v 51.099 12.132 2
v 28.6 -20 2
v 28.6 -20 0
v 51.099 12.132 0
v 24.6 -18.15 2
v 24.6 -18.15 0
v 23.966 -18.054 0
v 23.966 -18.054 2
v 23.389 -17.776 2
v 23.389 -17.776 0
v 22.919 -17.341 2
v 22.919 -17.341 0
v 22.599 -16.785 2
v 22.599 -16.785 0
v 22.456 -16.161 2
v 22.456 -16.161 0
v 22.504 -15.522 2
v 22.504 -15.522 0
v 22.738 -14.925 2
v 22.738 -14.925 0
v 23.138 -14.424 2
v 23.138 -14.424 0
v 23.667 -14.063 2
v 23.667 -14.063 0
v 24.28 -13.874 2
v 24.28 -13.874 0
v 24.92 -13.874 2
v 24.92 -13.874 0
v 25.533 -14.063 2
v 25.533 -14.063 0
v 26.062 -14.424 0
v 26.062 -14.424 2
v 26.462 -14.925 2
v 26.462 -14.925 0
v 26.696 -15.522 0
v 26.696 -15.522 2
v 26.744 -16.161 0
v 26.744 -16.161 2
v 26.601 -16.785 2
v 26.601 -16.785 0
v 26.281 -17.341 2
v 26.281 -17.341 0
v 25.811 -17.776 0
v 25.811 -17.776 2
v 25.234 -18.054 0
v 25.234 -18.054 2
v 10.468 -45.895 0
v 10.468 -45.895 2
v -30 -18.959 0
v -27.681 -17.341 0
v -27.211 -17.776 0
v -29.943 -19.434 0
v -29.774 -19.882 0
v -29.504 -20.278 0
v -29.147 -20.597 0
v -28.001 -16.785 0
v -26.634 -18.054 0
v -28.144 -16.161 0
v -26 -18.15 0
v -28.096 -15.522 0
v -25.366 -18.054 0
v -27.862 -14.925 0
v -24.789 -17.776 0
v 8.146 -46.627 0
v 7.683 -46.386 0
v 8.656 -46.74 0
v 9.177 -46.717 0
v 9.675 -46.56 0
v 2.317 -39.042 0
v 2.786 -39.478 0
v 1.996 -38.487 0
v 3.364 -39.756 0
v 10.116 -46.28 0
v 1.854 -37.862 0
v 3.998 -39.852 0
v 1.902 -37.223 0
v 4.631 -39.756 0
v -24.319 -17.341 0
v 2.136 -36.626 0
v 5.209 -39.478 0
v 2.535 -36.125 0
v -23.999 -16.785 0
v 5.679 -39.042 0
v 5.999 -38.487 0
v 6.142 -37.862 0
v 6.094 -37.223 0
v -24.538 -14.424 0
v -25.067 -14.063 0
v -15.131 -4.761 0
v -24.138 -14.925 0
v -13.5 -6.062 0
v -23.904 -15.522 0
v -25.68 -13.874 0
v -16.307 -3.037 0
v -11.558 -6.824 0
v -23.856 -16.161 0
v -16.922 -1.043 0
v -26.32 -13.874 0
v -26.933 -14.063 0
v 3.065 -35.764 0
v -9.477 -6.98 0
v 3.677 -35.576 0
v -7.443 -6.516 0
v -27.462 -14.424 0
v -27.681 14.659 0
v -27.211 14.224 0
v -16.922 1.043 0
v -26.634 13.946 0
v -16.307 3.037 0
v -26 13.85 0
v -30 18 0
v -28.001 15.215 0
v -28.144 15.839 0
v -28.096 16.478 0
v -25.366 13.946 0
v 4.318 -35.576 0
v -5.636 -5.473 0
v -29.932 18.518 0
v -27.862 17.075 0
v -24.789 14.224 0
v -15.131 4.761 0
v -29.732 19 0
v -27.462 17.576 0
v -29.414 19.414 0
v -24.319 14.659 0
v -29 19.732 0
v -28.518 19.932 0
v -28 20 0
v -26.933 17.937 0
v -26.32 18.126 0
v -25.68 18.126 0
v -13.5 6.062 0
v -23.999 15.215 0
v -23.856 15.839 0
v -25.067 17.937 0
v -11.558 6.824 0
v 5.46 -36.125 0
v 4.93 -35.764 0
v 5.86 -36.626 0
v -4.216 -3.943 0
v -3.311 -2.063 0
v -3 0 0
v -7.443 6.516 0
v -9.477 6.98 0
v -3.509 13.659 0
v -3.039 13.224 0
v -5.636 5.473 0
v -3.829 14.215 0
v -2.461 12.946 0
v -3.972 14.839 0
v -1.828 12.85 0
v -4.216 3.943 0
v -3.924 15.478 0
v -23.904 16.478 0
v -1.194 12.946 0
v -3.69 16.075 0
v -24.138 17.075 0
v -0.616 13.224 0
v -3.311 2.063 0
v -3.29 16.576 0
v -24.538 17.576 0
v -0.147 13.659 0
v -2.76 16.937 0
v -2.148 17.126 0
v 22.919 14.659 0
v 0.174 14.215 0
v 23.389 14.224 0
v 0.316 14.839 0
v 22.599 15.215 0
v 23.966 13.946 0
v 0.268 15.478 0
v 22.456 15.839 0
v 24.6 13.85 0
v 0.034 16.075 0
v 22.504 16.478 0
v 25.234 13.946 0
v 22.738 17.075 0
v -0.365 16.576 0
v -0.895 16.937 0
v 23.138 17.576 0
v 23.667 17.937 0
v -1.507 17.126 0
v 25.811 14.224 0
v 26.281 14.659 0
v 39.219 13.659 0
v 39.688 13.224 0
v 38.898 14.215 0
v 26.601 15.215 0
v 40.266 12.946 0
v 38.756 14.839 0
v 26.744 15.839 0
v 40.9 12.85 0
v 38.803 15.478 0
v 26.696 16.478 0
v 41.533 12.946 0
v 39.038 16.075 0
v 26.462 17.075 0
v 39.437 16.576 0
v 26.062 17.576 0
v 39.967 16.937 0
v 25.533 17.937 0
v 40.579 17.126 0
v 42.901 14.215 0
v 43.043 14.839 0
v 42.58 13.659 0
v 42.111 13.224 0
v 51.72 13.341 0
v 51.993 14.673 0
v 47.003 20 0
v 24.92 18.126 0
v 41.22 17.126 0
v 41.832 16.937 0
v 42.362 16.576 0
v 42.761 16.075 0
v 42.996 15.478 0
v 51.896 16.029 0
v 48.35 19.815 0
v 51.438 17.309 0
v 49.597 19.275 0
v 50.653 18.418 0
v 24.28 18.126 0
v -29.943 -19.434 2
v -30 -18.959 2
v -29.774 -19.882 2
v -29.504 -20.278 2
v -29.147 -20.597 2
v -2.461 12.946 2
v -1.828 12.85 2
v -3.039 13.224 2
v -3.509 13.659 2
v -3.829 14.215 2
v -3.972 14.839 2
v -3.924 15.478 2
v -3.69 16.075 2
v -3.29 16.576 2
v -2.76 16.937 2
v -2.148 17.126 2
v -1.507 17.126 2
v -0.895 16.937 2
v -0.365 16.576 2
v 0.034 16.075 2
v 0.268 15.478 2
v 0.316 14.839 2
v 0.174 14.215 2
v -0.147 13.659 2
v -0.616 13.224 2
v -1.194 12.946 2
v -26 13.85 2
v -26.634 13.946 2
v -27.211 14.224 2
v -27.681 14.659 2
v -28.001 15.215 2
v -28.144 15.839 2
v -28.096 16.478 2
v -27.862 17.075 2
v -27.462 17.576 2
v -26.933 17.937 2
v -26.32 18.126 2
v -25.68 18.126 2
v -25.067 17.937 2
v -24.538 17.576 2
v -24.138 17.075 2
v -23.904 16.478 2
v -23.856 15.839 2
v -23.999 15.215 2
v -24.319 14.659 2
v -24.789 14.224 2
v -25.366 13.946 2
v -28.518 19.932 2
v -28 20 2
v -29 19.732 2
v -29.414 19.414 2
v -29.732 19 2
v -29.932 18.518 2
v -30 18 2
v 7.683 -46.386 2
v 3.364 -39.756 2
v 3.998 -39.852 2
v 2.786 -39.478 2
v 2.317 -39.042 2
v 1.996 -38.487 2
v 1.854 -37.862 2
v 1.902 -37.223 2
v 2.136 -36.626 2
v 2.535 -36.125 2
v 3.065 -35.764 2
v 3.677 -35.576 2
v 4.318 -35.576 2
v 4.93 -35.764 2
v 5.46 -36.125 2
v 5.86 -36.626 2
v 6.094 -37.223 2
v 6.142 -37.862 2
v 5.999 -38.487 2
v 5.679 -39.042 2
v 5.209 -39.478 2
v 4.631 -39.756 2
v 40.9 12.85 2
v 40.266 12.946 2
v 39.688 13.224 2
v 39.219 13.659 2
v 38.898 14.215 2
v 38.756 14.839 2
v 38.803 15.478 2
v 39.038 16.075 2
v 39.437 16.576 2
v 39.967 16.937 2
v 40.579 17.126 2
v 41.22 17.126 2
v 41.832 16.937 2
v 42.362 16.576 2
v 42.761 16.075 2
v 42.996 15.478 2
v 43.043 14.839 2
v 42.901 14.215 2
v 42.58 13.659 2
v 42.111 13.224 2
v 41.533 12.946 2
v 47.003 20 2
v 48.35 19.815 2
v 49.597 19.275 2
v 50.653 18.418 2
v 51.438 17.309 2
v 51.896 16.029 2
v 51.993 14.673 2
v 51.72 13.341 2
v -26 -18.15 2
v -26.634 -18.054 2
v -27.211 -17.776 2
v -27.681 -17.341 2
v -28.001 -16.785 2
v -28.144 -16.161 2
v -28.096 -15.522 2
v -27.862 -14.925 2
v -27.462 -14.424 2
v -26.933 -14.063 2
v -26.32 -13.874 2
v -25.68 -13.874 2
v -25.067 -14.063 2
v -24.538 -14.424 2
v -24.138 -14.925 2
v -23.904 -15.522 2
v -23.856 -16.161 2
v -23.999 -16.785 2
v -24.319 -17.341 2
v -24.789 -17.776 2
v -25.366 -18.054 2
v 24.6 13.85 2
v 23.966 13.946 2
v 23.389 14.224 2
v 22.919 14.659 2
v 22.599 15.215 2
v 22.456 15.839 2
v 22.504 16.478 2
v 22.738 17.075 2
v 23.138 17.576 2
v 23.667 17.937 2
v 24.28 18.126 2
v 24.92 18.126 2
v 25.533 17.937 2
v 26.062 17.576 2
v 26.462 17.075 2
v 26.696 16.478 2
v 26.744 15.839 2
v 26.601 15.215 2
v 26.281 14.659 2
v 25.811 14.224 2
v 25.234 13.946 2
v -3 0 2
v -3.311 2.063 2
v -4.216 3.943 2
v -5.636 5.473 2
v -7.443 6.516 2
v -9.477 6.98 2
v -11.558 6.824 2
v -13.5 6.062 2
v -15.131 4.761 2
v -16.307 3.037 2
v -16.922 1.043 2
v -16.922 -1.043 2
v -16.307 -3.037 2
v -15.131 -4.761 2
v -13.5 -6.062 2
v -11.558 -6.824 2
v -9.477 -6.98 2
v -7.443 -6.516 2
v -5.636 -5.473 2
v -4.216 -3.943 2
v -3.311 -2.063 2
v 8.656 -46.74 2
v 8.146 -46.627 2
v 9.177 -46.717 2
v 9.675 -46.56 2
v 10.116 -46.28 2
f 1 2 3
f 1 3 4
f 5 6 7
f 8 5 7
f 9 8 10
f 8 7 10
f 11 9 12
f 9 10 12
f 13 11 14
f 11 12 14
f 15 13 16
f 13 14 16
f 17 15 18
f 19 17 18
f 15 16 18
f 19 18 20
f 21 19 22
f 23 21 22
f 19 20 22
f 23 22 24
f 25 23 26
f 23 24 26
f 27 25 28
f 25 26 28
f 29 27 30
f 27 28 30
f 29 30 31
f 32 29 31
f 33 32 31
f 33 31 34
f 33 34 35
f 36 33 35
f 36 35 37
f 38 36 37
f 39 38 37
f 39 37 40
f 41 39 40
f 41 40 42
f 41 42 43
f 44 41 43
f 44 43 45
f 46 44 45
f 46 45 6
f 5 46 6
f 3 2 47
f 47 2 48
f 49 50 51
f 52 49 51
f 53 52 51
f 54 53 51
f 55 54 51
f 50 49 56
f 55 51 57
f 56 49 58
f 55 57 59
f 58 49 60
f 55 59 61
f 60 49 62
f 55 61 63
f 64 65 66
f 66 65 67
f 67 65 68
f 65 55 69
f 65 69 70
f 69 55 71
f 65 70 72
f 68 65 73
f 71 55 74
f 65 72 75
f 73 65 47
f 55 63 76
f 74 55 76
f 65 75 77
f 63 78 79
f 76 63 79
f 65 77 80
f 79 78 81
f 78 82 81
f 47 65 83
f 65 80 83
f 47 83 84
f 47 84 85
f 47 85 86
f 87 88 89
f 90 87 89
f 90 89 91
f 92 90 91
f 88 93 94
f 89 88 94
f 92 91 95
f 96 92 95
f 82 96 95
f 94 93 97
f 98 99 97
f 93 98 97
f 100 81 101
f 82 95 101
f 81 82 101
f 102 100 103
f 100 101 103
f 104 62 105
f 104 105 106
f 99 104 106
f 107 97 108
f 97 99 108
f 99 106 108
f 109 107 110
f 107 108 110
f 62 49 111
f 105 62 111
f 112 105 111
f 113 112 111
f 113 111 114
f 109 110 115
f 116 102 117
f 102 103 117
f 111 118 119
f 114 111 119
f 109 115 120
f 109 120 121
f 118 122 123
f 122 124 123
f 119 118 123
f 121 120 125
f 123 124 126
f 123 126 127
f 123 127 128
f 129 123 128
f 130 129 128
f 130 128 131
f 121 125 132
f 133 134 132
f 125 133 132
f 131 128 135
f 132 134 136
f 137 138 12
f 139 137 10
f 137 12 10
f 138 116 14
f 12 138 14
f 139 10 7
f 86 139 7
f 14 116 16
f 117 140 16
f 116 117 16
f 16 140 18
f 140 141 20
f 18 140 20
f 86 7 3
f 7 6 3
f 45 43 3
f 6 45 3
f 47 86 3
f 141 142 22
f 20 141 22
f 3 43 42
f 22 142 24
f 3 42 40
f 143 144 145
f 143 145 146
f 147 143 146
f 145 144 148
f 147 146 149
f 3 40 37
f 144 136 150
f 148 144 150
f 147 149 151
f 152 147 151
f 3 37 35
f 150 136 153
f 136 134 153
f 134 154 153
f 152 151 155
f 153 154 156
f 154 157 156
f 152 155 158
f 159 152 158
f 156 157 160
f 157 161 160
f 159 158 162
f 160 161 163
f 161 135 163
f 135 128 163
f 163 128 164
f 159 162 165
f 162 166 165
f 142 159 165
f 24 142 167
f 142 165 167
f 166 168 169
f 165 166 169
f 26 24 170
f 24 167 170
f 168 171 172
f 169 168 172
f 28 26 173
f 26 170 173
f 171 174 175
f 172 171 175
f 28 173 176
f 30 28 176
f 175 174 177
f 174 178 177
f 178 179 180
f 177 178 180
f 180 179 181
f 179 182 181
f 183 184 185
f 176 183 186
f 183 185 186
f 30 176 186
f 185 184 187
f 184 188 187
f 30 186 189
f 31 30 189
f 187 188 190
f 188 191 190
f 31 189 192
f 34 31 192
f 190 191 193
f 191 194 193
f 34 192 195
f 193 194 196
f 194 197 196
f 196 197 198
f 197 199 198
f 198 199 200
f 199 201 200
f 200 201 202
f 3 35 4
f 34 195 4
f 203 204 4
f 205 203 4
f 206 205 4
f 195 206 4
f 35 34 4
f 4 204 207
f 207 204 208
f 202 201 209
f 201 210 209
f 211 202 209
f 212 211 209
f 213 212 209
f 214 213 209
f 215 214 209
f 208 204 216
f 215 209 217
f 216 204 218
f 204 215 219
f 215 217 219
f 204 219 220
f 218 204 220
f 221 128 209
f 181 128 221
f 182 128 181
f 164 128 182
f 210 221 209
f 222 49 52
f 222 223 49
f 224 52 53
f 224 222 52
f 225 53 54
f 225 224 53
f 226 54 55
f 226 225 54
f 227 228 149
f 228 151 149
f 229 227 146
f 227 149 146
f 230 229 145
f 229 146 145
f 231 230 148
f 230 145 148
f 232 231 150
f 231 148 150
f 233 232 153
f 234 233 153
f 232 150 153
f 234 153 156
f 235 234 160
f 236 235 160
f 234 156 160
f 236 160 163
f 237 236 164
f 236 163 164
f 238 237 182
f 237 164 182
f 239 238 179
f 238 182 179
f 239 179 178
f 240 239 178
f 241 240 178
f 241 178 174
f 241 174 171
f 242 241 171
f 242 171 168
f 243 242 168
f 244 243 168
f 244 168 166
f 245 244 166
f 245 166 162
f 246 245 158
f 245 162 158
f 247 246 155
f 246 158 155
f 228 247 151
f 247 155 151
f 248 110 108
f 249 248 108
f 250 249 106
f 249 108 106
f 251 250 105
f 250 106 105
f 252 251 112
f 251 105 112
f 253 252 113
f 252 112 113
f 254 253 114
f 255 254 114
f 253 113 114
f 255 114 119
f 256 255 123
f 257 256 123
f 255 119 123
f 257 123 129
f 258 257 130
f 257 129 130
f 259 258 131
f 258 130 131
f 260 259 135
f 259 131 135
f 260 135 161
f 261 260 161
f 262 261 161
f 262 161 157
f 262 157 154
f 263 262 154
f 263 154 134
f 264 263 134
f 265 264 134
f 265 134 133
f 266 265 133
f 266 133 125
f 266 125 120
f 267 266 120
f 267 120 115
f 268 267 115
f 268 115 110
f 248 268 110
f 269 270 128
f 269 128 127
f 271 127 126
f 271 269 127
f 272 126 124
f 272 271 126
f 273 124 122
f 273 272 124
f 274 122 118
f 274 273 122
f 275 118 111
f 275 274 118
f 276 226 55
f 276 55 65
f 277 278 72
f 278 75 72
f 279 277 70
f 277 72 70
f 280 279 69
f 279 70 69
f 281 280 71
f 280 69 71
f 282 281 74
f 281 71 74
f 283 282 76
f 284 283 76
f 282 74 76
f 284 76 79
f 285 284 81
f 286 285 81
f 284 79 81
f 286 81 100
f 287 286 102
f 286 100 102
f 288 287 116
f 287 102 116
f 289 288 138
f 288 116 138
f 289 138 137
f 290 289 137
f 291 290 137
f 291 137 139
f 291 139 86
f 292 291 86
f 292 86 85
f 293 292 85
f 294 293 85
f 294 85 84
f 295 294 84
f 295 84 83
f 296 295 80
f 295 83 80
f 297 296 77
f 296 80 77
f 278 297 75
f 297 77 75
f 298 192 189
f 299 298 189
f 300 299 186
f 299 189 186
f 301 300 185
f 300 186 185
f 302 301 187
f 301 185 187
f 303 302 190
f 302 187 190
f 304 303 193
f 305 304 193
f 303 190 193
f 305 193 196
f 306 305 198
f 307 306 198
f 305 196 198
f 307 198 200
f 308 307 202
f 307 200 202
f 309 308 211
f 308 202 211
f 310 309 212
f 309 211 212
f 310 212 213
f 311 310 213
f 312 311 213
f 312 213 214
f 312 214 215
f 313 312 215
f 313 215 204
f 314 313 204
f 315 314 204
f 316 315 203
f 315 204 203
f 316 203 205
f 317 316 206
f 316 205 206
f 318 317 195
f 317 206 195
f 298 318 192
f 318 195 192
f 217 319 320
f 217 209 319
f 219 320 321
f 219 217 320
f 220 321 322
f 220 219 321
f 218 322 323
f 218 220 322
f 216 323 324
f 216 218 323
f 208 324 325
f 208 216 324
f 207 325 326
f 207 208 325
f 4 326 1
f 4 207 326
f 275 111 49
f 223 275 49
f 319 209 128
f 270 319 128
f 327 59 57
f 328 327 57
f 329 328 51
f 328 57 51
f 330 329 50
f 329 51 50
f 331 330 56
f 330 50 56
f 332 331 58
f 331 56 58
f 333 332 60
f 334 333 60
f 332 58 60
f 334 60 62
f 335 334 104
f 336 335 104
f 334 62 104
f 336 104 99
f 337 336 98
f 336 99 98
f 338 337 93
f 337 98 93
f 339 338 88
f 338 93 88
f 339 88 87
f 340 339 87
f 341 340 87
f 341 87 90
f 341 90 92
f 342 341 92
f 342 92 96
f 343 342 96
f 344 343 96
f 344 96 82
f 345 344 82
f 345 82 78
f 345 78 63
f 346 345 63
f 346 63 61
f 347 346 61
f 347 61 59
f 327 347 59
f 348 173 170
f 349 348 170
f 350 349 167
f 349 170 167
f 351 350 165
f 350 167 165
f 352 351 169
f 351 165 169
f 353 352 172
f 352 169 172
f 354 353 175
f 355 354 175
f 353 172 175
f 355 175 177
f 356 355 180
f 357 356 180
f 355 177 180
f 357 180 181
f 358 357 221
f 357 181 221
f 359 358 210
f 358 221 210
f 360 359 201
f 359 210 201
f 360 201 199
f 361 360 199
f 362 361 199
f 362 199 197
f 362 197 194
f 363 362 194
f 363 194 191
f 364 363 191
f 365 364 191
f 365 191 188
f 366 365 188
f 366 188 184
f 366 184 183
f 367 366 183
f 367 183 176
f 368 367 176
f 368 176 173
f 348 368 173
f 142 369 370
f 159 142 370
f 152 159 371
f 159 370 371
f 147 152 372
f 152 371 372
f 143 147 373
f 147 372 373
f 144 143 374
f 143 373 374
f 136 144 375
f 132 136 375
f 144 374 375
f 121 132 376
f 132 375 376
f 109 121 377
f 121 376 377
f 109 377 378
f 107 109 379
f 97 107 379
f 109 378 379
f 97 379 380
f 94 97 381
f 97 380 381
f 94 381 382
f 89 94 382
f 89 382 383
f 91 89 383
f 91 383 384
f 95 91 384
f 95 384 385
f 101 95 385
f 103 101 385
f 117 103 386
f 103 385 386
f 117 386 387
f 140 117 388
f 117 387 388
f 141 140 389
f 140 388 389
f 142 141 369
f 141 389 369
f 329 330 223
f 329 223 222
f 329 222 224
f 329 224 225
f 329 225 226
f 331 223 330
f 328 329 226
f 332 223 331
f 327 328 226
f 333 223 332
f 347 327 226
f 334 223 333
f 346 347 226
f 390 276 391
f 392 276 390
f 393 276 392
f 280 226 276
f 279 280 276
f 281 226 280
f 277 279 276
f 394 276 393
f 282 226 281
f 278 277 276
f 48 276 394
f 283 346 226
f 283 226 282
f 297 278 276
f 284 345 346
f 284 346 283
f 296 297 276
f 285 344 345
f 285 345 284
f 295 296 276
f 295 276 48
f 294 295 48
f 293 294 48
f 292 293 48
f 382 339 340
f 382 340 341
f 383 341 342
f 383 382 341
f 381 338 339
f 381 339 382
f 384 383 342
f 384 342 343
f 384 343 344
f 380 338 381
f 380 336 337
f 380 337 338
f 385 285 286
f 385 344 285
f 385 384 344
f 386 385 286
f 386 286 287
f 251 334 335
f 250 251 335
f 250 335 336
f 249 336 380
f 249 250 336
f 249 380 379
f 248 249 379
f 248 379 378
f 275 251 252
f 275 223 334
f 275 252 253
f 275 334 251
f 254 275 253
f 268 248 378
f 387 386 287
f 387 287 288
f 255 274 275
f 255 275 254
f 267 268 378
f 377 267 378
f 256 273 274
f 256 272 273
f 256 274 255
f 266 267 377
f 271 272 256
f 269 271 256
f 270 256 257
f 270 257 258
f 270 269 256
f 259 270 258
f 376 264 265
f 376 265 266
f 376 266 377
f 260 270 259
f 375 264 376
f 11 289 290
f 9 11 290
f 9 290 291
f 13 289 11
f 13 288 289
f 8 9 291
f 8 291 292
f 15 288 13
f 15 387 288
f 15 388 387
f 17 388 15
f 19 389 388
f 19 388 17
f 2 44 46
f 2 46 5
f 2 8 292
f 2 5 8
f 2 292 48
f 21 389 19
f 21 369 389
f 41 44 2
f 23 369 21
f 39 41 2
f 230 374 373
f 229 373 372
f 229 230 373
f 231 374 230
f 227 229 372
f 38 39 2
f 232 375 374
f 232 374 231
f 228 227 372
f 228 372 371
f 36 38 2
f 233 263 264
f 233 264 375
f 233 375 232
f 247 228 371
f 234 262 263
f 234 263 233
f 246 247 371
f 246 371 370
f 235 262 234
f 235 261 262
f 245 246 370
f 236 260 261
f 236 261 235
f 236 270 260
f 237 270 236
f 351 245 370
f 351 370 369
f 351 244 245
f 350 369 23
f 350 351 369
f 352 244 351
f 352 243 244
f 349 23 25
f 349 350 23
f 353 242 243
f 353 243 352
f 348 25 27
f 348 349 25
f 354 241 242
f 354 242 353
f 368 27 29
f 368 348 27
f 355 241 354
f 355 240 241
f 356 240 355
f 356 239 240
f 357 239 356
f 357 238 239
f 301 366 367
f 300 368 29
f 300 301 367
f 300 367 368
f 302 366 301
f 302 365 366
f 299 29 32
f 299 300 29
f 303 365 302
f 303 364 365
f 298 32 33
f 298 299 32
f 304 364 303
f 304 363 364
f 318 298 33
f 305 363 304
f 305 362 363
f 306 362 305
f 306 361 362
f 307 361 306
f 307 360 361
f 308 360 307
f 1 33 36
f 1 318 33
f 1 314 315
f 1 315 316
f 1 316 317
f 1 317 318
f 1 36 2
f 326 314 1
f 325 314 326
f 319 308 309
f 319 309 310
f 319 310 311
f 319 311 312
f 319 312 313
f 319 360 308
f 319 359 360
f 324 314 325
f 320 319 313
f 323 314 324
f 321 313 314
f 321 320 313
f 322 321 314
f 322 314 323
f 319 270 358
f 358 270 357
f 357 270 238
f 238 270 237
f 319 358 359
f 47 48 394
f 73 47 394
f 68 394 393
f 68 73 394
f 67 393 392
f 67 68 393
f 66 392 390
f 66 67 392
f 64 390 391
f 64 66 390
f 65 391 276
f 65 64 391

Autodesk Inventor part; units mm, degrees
ref_plane "YZ Plane" through (0, 0, 0) normal (1, 0, 0) x (0, 1, 0)
ref_plane "XZ Plane" through (0, 0, 0) normal (0, 1, 0) x (-1, 0, 0)
ref_plane "XY Plane" through (0, 0, 0) normal (0, 0, 1) x (1, 0, 0)
sketch "スケッチ1" plane through (0, 0, 0) normal (0, 0, 1) x (1, 0, 0)
  line L0 (-30, -20) -> (28.6, -20)
  line L1 (28.6, -20) -> (28.6, 20)
  line L2 (28.6, 20) -> (-30, 20)
  line L3 (-30, 20) -> (-30, -20)
  point P0 (0, 0)
  dimension "d1" = 40
  dimension "d28" = 30
  dimension "d29" = 28.6
  dimension "d32" = 20
extrude "プレート1" add sketch "スケッチ1" along normal blind 2
sketch "スケッチ2" plane through (0, 0, 2) normal (0, 0, 1) x (1, 0, 0)
  line L0 (-24, -5) -> (24.6, -5)
  line L1 (24.6, -5) -> (24.6, 5)
  line L2 (24.6, 5) -> (-24, 5)
  line L3 (-24, 5) -> (-24, -5)
  line L4 (-24, -5) -> (24.6, 5) construction
  line L5 (24.6, -5) -> (-24, 5) construction
  line L6 (28.6, -20) -> (-30, -20) projected
  line L7 (-30, -20) -> (-30, 20) projected
  line L8 (28.6, -20) -> (-30, -20) projected
  line L9 (28.6, 20) -> (28.6, -20) projected
  line L10 (-30, 20) -> (28.6, 20) projected
  circle A0 centre (-10, 0) radius 7
  point P0 (0.3, 0)
  point P1 (0.3, 0)
  point P2 (0.3, 0)
  point P3 (0, 0)
  dimension "GapSize" = 2
  dimension "d3" = 48.6
  dimension "d5" = 10
  dimension "d8" = 20
  dimension "d16" = 14
  dimension "d30" = 20
  dimension "d31" = 14
extrude "押し出し1" cut sketch "スケッチ2" against normal blind 10 contours A0 L2 L0 | L0 A0 | A0 L2
sketch "スケッチ3" plane through (0, 0, 2) normal (0, 0, 1) x (1, 0, 0)
  line L0 (-30, 20) -> (28.6, 20) projected
  line L1 (-30, -20) -> (-30, 20) projected
  line L2 (28.6, -20) -> (-30, -20) projected
  line L3 (28.6, 20) -> (28.6, -20) projected
  line L4 (24.6, 16) -> (-26, 16)
  line L5 (-26, 16) -> (-26, -16)
  line L6 (-26, -16) -> (24.6, -16)
  line L7 (24.6, -16) -> (24.6, 16)
  point P0 (0, 0)
  dimension "d19" = 4
hole "穴2" at (-26, 16, 2) at (-26, -16, 2) at (24.6, 16, 2) at (24.6, -16, 2) direction (0, 0, -1) diameter 4.3 end through all clearance for "Socket Head Cap Screw" size "M4" standard "Ansi Metric M Profile"
sketch "スケッチ4" plane through (0, 0, 2) normal (0, 0, 1) x (1, 0, 0)
  line L0 (-30, -20) -> (28.6, -20)
  line L1 (28.6, -20) -> (56.6083, 20)
  line L2 (28.6, 20) -> (28.6, -20)
  line L3 (28.6, 20) -> (56.6083, 20)
  line L4 (-30, -20) -> (9.3212, -47.533)
  line L5 (28.6, -20) -> (9.3212, -47.533)
  point P0 (0, 0)
  dimension "d33" = 35
  dimension "d34" = 35
sheet face with bend "面2" sketch "スケッチ4" thickness 2 toward (0, 0, -1) bend radius 2
bend "曲げ1"
sketch "スケッチ5" plane through (0, 0, 2) normal (0, 0, 1) x (1, 0, 0)
  line L0 (-30, -20) -> (9.3212, -47.533) projected
  line L1 (9.3212, -47.533) -> (56.6083, 20) projected
  line L2 (56.6083, 20) -> (-30, 20) projected
  point P0 (0, 0)
  point P1 (3.9976, -37.7015)
  point P2 (40.8995, 15)
  point P3 (-1.8276, 15)
  dimension "d40" = 5
  dimension "d41" = 10
  dimension "d42" = 10
  dimension "d43" = 5
  dimension "d44" = 5
  dimension "d45" = 45
hole "穴3" at (3.9976, -37.7015, 2) at (40.8995, 15, 2) at (-1.8276, 15, 2) direction (0, 0, -1) diameter 4.3 end through all
fillet "フィレット1" radius 2 3 edges at (-30, 20, 1) (-30, -20, 1) (9.3212, -47.533, 1)
fillet "フィレット2" radius 5 1 edges at (56.6083, 20, 1)
equation "\"GapSize\" = Thickness"
equation "\"d42\" = d41"
equation "\"d43\" = d40"
equation "\"d44\" = d40"
equation "\"d51\" = Thickness"
equation "\"d2\" = Thickness"
equation "\"d35\" = BendRadius"
equation "\"d36\" = BendReliefWidth"
equation "\"d38\" = MinimumRemnant"
equation "\"d37\" = BendReliefDepth"
equation "\"d39\" = TransitionRadius"
equation "\"BendRadius\" = Thickness"
equation "\"BendReliefWidth\" = Thickness"
equation "\"BendReliefDepth\" = 0.5 * Thickness"
equation "\"CornerReliefSize\" = 4 * Thickness"
equation "\"MinimumRemnant\" = 2 * Thickness"
equation "\"TransitionRadius\" = BendRadius"
equation "\"JacobiRadiusSize\" = BendRadius"
equation "\"Thickness\" = 2"
properties part number "s_carbon_plate4" material "CFRP"
